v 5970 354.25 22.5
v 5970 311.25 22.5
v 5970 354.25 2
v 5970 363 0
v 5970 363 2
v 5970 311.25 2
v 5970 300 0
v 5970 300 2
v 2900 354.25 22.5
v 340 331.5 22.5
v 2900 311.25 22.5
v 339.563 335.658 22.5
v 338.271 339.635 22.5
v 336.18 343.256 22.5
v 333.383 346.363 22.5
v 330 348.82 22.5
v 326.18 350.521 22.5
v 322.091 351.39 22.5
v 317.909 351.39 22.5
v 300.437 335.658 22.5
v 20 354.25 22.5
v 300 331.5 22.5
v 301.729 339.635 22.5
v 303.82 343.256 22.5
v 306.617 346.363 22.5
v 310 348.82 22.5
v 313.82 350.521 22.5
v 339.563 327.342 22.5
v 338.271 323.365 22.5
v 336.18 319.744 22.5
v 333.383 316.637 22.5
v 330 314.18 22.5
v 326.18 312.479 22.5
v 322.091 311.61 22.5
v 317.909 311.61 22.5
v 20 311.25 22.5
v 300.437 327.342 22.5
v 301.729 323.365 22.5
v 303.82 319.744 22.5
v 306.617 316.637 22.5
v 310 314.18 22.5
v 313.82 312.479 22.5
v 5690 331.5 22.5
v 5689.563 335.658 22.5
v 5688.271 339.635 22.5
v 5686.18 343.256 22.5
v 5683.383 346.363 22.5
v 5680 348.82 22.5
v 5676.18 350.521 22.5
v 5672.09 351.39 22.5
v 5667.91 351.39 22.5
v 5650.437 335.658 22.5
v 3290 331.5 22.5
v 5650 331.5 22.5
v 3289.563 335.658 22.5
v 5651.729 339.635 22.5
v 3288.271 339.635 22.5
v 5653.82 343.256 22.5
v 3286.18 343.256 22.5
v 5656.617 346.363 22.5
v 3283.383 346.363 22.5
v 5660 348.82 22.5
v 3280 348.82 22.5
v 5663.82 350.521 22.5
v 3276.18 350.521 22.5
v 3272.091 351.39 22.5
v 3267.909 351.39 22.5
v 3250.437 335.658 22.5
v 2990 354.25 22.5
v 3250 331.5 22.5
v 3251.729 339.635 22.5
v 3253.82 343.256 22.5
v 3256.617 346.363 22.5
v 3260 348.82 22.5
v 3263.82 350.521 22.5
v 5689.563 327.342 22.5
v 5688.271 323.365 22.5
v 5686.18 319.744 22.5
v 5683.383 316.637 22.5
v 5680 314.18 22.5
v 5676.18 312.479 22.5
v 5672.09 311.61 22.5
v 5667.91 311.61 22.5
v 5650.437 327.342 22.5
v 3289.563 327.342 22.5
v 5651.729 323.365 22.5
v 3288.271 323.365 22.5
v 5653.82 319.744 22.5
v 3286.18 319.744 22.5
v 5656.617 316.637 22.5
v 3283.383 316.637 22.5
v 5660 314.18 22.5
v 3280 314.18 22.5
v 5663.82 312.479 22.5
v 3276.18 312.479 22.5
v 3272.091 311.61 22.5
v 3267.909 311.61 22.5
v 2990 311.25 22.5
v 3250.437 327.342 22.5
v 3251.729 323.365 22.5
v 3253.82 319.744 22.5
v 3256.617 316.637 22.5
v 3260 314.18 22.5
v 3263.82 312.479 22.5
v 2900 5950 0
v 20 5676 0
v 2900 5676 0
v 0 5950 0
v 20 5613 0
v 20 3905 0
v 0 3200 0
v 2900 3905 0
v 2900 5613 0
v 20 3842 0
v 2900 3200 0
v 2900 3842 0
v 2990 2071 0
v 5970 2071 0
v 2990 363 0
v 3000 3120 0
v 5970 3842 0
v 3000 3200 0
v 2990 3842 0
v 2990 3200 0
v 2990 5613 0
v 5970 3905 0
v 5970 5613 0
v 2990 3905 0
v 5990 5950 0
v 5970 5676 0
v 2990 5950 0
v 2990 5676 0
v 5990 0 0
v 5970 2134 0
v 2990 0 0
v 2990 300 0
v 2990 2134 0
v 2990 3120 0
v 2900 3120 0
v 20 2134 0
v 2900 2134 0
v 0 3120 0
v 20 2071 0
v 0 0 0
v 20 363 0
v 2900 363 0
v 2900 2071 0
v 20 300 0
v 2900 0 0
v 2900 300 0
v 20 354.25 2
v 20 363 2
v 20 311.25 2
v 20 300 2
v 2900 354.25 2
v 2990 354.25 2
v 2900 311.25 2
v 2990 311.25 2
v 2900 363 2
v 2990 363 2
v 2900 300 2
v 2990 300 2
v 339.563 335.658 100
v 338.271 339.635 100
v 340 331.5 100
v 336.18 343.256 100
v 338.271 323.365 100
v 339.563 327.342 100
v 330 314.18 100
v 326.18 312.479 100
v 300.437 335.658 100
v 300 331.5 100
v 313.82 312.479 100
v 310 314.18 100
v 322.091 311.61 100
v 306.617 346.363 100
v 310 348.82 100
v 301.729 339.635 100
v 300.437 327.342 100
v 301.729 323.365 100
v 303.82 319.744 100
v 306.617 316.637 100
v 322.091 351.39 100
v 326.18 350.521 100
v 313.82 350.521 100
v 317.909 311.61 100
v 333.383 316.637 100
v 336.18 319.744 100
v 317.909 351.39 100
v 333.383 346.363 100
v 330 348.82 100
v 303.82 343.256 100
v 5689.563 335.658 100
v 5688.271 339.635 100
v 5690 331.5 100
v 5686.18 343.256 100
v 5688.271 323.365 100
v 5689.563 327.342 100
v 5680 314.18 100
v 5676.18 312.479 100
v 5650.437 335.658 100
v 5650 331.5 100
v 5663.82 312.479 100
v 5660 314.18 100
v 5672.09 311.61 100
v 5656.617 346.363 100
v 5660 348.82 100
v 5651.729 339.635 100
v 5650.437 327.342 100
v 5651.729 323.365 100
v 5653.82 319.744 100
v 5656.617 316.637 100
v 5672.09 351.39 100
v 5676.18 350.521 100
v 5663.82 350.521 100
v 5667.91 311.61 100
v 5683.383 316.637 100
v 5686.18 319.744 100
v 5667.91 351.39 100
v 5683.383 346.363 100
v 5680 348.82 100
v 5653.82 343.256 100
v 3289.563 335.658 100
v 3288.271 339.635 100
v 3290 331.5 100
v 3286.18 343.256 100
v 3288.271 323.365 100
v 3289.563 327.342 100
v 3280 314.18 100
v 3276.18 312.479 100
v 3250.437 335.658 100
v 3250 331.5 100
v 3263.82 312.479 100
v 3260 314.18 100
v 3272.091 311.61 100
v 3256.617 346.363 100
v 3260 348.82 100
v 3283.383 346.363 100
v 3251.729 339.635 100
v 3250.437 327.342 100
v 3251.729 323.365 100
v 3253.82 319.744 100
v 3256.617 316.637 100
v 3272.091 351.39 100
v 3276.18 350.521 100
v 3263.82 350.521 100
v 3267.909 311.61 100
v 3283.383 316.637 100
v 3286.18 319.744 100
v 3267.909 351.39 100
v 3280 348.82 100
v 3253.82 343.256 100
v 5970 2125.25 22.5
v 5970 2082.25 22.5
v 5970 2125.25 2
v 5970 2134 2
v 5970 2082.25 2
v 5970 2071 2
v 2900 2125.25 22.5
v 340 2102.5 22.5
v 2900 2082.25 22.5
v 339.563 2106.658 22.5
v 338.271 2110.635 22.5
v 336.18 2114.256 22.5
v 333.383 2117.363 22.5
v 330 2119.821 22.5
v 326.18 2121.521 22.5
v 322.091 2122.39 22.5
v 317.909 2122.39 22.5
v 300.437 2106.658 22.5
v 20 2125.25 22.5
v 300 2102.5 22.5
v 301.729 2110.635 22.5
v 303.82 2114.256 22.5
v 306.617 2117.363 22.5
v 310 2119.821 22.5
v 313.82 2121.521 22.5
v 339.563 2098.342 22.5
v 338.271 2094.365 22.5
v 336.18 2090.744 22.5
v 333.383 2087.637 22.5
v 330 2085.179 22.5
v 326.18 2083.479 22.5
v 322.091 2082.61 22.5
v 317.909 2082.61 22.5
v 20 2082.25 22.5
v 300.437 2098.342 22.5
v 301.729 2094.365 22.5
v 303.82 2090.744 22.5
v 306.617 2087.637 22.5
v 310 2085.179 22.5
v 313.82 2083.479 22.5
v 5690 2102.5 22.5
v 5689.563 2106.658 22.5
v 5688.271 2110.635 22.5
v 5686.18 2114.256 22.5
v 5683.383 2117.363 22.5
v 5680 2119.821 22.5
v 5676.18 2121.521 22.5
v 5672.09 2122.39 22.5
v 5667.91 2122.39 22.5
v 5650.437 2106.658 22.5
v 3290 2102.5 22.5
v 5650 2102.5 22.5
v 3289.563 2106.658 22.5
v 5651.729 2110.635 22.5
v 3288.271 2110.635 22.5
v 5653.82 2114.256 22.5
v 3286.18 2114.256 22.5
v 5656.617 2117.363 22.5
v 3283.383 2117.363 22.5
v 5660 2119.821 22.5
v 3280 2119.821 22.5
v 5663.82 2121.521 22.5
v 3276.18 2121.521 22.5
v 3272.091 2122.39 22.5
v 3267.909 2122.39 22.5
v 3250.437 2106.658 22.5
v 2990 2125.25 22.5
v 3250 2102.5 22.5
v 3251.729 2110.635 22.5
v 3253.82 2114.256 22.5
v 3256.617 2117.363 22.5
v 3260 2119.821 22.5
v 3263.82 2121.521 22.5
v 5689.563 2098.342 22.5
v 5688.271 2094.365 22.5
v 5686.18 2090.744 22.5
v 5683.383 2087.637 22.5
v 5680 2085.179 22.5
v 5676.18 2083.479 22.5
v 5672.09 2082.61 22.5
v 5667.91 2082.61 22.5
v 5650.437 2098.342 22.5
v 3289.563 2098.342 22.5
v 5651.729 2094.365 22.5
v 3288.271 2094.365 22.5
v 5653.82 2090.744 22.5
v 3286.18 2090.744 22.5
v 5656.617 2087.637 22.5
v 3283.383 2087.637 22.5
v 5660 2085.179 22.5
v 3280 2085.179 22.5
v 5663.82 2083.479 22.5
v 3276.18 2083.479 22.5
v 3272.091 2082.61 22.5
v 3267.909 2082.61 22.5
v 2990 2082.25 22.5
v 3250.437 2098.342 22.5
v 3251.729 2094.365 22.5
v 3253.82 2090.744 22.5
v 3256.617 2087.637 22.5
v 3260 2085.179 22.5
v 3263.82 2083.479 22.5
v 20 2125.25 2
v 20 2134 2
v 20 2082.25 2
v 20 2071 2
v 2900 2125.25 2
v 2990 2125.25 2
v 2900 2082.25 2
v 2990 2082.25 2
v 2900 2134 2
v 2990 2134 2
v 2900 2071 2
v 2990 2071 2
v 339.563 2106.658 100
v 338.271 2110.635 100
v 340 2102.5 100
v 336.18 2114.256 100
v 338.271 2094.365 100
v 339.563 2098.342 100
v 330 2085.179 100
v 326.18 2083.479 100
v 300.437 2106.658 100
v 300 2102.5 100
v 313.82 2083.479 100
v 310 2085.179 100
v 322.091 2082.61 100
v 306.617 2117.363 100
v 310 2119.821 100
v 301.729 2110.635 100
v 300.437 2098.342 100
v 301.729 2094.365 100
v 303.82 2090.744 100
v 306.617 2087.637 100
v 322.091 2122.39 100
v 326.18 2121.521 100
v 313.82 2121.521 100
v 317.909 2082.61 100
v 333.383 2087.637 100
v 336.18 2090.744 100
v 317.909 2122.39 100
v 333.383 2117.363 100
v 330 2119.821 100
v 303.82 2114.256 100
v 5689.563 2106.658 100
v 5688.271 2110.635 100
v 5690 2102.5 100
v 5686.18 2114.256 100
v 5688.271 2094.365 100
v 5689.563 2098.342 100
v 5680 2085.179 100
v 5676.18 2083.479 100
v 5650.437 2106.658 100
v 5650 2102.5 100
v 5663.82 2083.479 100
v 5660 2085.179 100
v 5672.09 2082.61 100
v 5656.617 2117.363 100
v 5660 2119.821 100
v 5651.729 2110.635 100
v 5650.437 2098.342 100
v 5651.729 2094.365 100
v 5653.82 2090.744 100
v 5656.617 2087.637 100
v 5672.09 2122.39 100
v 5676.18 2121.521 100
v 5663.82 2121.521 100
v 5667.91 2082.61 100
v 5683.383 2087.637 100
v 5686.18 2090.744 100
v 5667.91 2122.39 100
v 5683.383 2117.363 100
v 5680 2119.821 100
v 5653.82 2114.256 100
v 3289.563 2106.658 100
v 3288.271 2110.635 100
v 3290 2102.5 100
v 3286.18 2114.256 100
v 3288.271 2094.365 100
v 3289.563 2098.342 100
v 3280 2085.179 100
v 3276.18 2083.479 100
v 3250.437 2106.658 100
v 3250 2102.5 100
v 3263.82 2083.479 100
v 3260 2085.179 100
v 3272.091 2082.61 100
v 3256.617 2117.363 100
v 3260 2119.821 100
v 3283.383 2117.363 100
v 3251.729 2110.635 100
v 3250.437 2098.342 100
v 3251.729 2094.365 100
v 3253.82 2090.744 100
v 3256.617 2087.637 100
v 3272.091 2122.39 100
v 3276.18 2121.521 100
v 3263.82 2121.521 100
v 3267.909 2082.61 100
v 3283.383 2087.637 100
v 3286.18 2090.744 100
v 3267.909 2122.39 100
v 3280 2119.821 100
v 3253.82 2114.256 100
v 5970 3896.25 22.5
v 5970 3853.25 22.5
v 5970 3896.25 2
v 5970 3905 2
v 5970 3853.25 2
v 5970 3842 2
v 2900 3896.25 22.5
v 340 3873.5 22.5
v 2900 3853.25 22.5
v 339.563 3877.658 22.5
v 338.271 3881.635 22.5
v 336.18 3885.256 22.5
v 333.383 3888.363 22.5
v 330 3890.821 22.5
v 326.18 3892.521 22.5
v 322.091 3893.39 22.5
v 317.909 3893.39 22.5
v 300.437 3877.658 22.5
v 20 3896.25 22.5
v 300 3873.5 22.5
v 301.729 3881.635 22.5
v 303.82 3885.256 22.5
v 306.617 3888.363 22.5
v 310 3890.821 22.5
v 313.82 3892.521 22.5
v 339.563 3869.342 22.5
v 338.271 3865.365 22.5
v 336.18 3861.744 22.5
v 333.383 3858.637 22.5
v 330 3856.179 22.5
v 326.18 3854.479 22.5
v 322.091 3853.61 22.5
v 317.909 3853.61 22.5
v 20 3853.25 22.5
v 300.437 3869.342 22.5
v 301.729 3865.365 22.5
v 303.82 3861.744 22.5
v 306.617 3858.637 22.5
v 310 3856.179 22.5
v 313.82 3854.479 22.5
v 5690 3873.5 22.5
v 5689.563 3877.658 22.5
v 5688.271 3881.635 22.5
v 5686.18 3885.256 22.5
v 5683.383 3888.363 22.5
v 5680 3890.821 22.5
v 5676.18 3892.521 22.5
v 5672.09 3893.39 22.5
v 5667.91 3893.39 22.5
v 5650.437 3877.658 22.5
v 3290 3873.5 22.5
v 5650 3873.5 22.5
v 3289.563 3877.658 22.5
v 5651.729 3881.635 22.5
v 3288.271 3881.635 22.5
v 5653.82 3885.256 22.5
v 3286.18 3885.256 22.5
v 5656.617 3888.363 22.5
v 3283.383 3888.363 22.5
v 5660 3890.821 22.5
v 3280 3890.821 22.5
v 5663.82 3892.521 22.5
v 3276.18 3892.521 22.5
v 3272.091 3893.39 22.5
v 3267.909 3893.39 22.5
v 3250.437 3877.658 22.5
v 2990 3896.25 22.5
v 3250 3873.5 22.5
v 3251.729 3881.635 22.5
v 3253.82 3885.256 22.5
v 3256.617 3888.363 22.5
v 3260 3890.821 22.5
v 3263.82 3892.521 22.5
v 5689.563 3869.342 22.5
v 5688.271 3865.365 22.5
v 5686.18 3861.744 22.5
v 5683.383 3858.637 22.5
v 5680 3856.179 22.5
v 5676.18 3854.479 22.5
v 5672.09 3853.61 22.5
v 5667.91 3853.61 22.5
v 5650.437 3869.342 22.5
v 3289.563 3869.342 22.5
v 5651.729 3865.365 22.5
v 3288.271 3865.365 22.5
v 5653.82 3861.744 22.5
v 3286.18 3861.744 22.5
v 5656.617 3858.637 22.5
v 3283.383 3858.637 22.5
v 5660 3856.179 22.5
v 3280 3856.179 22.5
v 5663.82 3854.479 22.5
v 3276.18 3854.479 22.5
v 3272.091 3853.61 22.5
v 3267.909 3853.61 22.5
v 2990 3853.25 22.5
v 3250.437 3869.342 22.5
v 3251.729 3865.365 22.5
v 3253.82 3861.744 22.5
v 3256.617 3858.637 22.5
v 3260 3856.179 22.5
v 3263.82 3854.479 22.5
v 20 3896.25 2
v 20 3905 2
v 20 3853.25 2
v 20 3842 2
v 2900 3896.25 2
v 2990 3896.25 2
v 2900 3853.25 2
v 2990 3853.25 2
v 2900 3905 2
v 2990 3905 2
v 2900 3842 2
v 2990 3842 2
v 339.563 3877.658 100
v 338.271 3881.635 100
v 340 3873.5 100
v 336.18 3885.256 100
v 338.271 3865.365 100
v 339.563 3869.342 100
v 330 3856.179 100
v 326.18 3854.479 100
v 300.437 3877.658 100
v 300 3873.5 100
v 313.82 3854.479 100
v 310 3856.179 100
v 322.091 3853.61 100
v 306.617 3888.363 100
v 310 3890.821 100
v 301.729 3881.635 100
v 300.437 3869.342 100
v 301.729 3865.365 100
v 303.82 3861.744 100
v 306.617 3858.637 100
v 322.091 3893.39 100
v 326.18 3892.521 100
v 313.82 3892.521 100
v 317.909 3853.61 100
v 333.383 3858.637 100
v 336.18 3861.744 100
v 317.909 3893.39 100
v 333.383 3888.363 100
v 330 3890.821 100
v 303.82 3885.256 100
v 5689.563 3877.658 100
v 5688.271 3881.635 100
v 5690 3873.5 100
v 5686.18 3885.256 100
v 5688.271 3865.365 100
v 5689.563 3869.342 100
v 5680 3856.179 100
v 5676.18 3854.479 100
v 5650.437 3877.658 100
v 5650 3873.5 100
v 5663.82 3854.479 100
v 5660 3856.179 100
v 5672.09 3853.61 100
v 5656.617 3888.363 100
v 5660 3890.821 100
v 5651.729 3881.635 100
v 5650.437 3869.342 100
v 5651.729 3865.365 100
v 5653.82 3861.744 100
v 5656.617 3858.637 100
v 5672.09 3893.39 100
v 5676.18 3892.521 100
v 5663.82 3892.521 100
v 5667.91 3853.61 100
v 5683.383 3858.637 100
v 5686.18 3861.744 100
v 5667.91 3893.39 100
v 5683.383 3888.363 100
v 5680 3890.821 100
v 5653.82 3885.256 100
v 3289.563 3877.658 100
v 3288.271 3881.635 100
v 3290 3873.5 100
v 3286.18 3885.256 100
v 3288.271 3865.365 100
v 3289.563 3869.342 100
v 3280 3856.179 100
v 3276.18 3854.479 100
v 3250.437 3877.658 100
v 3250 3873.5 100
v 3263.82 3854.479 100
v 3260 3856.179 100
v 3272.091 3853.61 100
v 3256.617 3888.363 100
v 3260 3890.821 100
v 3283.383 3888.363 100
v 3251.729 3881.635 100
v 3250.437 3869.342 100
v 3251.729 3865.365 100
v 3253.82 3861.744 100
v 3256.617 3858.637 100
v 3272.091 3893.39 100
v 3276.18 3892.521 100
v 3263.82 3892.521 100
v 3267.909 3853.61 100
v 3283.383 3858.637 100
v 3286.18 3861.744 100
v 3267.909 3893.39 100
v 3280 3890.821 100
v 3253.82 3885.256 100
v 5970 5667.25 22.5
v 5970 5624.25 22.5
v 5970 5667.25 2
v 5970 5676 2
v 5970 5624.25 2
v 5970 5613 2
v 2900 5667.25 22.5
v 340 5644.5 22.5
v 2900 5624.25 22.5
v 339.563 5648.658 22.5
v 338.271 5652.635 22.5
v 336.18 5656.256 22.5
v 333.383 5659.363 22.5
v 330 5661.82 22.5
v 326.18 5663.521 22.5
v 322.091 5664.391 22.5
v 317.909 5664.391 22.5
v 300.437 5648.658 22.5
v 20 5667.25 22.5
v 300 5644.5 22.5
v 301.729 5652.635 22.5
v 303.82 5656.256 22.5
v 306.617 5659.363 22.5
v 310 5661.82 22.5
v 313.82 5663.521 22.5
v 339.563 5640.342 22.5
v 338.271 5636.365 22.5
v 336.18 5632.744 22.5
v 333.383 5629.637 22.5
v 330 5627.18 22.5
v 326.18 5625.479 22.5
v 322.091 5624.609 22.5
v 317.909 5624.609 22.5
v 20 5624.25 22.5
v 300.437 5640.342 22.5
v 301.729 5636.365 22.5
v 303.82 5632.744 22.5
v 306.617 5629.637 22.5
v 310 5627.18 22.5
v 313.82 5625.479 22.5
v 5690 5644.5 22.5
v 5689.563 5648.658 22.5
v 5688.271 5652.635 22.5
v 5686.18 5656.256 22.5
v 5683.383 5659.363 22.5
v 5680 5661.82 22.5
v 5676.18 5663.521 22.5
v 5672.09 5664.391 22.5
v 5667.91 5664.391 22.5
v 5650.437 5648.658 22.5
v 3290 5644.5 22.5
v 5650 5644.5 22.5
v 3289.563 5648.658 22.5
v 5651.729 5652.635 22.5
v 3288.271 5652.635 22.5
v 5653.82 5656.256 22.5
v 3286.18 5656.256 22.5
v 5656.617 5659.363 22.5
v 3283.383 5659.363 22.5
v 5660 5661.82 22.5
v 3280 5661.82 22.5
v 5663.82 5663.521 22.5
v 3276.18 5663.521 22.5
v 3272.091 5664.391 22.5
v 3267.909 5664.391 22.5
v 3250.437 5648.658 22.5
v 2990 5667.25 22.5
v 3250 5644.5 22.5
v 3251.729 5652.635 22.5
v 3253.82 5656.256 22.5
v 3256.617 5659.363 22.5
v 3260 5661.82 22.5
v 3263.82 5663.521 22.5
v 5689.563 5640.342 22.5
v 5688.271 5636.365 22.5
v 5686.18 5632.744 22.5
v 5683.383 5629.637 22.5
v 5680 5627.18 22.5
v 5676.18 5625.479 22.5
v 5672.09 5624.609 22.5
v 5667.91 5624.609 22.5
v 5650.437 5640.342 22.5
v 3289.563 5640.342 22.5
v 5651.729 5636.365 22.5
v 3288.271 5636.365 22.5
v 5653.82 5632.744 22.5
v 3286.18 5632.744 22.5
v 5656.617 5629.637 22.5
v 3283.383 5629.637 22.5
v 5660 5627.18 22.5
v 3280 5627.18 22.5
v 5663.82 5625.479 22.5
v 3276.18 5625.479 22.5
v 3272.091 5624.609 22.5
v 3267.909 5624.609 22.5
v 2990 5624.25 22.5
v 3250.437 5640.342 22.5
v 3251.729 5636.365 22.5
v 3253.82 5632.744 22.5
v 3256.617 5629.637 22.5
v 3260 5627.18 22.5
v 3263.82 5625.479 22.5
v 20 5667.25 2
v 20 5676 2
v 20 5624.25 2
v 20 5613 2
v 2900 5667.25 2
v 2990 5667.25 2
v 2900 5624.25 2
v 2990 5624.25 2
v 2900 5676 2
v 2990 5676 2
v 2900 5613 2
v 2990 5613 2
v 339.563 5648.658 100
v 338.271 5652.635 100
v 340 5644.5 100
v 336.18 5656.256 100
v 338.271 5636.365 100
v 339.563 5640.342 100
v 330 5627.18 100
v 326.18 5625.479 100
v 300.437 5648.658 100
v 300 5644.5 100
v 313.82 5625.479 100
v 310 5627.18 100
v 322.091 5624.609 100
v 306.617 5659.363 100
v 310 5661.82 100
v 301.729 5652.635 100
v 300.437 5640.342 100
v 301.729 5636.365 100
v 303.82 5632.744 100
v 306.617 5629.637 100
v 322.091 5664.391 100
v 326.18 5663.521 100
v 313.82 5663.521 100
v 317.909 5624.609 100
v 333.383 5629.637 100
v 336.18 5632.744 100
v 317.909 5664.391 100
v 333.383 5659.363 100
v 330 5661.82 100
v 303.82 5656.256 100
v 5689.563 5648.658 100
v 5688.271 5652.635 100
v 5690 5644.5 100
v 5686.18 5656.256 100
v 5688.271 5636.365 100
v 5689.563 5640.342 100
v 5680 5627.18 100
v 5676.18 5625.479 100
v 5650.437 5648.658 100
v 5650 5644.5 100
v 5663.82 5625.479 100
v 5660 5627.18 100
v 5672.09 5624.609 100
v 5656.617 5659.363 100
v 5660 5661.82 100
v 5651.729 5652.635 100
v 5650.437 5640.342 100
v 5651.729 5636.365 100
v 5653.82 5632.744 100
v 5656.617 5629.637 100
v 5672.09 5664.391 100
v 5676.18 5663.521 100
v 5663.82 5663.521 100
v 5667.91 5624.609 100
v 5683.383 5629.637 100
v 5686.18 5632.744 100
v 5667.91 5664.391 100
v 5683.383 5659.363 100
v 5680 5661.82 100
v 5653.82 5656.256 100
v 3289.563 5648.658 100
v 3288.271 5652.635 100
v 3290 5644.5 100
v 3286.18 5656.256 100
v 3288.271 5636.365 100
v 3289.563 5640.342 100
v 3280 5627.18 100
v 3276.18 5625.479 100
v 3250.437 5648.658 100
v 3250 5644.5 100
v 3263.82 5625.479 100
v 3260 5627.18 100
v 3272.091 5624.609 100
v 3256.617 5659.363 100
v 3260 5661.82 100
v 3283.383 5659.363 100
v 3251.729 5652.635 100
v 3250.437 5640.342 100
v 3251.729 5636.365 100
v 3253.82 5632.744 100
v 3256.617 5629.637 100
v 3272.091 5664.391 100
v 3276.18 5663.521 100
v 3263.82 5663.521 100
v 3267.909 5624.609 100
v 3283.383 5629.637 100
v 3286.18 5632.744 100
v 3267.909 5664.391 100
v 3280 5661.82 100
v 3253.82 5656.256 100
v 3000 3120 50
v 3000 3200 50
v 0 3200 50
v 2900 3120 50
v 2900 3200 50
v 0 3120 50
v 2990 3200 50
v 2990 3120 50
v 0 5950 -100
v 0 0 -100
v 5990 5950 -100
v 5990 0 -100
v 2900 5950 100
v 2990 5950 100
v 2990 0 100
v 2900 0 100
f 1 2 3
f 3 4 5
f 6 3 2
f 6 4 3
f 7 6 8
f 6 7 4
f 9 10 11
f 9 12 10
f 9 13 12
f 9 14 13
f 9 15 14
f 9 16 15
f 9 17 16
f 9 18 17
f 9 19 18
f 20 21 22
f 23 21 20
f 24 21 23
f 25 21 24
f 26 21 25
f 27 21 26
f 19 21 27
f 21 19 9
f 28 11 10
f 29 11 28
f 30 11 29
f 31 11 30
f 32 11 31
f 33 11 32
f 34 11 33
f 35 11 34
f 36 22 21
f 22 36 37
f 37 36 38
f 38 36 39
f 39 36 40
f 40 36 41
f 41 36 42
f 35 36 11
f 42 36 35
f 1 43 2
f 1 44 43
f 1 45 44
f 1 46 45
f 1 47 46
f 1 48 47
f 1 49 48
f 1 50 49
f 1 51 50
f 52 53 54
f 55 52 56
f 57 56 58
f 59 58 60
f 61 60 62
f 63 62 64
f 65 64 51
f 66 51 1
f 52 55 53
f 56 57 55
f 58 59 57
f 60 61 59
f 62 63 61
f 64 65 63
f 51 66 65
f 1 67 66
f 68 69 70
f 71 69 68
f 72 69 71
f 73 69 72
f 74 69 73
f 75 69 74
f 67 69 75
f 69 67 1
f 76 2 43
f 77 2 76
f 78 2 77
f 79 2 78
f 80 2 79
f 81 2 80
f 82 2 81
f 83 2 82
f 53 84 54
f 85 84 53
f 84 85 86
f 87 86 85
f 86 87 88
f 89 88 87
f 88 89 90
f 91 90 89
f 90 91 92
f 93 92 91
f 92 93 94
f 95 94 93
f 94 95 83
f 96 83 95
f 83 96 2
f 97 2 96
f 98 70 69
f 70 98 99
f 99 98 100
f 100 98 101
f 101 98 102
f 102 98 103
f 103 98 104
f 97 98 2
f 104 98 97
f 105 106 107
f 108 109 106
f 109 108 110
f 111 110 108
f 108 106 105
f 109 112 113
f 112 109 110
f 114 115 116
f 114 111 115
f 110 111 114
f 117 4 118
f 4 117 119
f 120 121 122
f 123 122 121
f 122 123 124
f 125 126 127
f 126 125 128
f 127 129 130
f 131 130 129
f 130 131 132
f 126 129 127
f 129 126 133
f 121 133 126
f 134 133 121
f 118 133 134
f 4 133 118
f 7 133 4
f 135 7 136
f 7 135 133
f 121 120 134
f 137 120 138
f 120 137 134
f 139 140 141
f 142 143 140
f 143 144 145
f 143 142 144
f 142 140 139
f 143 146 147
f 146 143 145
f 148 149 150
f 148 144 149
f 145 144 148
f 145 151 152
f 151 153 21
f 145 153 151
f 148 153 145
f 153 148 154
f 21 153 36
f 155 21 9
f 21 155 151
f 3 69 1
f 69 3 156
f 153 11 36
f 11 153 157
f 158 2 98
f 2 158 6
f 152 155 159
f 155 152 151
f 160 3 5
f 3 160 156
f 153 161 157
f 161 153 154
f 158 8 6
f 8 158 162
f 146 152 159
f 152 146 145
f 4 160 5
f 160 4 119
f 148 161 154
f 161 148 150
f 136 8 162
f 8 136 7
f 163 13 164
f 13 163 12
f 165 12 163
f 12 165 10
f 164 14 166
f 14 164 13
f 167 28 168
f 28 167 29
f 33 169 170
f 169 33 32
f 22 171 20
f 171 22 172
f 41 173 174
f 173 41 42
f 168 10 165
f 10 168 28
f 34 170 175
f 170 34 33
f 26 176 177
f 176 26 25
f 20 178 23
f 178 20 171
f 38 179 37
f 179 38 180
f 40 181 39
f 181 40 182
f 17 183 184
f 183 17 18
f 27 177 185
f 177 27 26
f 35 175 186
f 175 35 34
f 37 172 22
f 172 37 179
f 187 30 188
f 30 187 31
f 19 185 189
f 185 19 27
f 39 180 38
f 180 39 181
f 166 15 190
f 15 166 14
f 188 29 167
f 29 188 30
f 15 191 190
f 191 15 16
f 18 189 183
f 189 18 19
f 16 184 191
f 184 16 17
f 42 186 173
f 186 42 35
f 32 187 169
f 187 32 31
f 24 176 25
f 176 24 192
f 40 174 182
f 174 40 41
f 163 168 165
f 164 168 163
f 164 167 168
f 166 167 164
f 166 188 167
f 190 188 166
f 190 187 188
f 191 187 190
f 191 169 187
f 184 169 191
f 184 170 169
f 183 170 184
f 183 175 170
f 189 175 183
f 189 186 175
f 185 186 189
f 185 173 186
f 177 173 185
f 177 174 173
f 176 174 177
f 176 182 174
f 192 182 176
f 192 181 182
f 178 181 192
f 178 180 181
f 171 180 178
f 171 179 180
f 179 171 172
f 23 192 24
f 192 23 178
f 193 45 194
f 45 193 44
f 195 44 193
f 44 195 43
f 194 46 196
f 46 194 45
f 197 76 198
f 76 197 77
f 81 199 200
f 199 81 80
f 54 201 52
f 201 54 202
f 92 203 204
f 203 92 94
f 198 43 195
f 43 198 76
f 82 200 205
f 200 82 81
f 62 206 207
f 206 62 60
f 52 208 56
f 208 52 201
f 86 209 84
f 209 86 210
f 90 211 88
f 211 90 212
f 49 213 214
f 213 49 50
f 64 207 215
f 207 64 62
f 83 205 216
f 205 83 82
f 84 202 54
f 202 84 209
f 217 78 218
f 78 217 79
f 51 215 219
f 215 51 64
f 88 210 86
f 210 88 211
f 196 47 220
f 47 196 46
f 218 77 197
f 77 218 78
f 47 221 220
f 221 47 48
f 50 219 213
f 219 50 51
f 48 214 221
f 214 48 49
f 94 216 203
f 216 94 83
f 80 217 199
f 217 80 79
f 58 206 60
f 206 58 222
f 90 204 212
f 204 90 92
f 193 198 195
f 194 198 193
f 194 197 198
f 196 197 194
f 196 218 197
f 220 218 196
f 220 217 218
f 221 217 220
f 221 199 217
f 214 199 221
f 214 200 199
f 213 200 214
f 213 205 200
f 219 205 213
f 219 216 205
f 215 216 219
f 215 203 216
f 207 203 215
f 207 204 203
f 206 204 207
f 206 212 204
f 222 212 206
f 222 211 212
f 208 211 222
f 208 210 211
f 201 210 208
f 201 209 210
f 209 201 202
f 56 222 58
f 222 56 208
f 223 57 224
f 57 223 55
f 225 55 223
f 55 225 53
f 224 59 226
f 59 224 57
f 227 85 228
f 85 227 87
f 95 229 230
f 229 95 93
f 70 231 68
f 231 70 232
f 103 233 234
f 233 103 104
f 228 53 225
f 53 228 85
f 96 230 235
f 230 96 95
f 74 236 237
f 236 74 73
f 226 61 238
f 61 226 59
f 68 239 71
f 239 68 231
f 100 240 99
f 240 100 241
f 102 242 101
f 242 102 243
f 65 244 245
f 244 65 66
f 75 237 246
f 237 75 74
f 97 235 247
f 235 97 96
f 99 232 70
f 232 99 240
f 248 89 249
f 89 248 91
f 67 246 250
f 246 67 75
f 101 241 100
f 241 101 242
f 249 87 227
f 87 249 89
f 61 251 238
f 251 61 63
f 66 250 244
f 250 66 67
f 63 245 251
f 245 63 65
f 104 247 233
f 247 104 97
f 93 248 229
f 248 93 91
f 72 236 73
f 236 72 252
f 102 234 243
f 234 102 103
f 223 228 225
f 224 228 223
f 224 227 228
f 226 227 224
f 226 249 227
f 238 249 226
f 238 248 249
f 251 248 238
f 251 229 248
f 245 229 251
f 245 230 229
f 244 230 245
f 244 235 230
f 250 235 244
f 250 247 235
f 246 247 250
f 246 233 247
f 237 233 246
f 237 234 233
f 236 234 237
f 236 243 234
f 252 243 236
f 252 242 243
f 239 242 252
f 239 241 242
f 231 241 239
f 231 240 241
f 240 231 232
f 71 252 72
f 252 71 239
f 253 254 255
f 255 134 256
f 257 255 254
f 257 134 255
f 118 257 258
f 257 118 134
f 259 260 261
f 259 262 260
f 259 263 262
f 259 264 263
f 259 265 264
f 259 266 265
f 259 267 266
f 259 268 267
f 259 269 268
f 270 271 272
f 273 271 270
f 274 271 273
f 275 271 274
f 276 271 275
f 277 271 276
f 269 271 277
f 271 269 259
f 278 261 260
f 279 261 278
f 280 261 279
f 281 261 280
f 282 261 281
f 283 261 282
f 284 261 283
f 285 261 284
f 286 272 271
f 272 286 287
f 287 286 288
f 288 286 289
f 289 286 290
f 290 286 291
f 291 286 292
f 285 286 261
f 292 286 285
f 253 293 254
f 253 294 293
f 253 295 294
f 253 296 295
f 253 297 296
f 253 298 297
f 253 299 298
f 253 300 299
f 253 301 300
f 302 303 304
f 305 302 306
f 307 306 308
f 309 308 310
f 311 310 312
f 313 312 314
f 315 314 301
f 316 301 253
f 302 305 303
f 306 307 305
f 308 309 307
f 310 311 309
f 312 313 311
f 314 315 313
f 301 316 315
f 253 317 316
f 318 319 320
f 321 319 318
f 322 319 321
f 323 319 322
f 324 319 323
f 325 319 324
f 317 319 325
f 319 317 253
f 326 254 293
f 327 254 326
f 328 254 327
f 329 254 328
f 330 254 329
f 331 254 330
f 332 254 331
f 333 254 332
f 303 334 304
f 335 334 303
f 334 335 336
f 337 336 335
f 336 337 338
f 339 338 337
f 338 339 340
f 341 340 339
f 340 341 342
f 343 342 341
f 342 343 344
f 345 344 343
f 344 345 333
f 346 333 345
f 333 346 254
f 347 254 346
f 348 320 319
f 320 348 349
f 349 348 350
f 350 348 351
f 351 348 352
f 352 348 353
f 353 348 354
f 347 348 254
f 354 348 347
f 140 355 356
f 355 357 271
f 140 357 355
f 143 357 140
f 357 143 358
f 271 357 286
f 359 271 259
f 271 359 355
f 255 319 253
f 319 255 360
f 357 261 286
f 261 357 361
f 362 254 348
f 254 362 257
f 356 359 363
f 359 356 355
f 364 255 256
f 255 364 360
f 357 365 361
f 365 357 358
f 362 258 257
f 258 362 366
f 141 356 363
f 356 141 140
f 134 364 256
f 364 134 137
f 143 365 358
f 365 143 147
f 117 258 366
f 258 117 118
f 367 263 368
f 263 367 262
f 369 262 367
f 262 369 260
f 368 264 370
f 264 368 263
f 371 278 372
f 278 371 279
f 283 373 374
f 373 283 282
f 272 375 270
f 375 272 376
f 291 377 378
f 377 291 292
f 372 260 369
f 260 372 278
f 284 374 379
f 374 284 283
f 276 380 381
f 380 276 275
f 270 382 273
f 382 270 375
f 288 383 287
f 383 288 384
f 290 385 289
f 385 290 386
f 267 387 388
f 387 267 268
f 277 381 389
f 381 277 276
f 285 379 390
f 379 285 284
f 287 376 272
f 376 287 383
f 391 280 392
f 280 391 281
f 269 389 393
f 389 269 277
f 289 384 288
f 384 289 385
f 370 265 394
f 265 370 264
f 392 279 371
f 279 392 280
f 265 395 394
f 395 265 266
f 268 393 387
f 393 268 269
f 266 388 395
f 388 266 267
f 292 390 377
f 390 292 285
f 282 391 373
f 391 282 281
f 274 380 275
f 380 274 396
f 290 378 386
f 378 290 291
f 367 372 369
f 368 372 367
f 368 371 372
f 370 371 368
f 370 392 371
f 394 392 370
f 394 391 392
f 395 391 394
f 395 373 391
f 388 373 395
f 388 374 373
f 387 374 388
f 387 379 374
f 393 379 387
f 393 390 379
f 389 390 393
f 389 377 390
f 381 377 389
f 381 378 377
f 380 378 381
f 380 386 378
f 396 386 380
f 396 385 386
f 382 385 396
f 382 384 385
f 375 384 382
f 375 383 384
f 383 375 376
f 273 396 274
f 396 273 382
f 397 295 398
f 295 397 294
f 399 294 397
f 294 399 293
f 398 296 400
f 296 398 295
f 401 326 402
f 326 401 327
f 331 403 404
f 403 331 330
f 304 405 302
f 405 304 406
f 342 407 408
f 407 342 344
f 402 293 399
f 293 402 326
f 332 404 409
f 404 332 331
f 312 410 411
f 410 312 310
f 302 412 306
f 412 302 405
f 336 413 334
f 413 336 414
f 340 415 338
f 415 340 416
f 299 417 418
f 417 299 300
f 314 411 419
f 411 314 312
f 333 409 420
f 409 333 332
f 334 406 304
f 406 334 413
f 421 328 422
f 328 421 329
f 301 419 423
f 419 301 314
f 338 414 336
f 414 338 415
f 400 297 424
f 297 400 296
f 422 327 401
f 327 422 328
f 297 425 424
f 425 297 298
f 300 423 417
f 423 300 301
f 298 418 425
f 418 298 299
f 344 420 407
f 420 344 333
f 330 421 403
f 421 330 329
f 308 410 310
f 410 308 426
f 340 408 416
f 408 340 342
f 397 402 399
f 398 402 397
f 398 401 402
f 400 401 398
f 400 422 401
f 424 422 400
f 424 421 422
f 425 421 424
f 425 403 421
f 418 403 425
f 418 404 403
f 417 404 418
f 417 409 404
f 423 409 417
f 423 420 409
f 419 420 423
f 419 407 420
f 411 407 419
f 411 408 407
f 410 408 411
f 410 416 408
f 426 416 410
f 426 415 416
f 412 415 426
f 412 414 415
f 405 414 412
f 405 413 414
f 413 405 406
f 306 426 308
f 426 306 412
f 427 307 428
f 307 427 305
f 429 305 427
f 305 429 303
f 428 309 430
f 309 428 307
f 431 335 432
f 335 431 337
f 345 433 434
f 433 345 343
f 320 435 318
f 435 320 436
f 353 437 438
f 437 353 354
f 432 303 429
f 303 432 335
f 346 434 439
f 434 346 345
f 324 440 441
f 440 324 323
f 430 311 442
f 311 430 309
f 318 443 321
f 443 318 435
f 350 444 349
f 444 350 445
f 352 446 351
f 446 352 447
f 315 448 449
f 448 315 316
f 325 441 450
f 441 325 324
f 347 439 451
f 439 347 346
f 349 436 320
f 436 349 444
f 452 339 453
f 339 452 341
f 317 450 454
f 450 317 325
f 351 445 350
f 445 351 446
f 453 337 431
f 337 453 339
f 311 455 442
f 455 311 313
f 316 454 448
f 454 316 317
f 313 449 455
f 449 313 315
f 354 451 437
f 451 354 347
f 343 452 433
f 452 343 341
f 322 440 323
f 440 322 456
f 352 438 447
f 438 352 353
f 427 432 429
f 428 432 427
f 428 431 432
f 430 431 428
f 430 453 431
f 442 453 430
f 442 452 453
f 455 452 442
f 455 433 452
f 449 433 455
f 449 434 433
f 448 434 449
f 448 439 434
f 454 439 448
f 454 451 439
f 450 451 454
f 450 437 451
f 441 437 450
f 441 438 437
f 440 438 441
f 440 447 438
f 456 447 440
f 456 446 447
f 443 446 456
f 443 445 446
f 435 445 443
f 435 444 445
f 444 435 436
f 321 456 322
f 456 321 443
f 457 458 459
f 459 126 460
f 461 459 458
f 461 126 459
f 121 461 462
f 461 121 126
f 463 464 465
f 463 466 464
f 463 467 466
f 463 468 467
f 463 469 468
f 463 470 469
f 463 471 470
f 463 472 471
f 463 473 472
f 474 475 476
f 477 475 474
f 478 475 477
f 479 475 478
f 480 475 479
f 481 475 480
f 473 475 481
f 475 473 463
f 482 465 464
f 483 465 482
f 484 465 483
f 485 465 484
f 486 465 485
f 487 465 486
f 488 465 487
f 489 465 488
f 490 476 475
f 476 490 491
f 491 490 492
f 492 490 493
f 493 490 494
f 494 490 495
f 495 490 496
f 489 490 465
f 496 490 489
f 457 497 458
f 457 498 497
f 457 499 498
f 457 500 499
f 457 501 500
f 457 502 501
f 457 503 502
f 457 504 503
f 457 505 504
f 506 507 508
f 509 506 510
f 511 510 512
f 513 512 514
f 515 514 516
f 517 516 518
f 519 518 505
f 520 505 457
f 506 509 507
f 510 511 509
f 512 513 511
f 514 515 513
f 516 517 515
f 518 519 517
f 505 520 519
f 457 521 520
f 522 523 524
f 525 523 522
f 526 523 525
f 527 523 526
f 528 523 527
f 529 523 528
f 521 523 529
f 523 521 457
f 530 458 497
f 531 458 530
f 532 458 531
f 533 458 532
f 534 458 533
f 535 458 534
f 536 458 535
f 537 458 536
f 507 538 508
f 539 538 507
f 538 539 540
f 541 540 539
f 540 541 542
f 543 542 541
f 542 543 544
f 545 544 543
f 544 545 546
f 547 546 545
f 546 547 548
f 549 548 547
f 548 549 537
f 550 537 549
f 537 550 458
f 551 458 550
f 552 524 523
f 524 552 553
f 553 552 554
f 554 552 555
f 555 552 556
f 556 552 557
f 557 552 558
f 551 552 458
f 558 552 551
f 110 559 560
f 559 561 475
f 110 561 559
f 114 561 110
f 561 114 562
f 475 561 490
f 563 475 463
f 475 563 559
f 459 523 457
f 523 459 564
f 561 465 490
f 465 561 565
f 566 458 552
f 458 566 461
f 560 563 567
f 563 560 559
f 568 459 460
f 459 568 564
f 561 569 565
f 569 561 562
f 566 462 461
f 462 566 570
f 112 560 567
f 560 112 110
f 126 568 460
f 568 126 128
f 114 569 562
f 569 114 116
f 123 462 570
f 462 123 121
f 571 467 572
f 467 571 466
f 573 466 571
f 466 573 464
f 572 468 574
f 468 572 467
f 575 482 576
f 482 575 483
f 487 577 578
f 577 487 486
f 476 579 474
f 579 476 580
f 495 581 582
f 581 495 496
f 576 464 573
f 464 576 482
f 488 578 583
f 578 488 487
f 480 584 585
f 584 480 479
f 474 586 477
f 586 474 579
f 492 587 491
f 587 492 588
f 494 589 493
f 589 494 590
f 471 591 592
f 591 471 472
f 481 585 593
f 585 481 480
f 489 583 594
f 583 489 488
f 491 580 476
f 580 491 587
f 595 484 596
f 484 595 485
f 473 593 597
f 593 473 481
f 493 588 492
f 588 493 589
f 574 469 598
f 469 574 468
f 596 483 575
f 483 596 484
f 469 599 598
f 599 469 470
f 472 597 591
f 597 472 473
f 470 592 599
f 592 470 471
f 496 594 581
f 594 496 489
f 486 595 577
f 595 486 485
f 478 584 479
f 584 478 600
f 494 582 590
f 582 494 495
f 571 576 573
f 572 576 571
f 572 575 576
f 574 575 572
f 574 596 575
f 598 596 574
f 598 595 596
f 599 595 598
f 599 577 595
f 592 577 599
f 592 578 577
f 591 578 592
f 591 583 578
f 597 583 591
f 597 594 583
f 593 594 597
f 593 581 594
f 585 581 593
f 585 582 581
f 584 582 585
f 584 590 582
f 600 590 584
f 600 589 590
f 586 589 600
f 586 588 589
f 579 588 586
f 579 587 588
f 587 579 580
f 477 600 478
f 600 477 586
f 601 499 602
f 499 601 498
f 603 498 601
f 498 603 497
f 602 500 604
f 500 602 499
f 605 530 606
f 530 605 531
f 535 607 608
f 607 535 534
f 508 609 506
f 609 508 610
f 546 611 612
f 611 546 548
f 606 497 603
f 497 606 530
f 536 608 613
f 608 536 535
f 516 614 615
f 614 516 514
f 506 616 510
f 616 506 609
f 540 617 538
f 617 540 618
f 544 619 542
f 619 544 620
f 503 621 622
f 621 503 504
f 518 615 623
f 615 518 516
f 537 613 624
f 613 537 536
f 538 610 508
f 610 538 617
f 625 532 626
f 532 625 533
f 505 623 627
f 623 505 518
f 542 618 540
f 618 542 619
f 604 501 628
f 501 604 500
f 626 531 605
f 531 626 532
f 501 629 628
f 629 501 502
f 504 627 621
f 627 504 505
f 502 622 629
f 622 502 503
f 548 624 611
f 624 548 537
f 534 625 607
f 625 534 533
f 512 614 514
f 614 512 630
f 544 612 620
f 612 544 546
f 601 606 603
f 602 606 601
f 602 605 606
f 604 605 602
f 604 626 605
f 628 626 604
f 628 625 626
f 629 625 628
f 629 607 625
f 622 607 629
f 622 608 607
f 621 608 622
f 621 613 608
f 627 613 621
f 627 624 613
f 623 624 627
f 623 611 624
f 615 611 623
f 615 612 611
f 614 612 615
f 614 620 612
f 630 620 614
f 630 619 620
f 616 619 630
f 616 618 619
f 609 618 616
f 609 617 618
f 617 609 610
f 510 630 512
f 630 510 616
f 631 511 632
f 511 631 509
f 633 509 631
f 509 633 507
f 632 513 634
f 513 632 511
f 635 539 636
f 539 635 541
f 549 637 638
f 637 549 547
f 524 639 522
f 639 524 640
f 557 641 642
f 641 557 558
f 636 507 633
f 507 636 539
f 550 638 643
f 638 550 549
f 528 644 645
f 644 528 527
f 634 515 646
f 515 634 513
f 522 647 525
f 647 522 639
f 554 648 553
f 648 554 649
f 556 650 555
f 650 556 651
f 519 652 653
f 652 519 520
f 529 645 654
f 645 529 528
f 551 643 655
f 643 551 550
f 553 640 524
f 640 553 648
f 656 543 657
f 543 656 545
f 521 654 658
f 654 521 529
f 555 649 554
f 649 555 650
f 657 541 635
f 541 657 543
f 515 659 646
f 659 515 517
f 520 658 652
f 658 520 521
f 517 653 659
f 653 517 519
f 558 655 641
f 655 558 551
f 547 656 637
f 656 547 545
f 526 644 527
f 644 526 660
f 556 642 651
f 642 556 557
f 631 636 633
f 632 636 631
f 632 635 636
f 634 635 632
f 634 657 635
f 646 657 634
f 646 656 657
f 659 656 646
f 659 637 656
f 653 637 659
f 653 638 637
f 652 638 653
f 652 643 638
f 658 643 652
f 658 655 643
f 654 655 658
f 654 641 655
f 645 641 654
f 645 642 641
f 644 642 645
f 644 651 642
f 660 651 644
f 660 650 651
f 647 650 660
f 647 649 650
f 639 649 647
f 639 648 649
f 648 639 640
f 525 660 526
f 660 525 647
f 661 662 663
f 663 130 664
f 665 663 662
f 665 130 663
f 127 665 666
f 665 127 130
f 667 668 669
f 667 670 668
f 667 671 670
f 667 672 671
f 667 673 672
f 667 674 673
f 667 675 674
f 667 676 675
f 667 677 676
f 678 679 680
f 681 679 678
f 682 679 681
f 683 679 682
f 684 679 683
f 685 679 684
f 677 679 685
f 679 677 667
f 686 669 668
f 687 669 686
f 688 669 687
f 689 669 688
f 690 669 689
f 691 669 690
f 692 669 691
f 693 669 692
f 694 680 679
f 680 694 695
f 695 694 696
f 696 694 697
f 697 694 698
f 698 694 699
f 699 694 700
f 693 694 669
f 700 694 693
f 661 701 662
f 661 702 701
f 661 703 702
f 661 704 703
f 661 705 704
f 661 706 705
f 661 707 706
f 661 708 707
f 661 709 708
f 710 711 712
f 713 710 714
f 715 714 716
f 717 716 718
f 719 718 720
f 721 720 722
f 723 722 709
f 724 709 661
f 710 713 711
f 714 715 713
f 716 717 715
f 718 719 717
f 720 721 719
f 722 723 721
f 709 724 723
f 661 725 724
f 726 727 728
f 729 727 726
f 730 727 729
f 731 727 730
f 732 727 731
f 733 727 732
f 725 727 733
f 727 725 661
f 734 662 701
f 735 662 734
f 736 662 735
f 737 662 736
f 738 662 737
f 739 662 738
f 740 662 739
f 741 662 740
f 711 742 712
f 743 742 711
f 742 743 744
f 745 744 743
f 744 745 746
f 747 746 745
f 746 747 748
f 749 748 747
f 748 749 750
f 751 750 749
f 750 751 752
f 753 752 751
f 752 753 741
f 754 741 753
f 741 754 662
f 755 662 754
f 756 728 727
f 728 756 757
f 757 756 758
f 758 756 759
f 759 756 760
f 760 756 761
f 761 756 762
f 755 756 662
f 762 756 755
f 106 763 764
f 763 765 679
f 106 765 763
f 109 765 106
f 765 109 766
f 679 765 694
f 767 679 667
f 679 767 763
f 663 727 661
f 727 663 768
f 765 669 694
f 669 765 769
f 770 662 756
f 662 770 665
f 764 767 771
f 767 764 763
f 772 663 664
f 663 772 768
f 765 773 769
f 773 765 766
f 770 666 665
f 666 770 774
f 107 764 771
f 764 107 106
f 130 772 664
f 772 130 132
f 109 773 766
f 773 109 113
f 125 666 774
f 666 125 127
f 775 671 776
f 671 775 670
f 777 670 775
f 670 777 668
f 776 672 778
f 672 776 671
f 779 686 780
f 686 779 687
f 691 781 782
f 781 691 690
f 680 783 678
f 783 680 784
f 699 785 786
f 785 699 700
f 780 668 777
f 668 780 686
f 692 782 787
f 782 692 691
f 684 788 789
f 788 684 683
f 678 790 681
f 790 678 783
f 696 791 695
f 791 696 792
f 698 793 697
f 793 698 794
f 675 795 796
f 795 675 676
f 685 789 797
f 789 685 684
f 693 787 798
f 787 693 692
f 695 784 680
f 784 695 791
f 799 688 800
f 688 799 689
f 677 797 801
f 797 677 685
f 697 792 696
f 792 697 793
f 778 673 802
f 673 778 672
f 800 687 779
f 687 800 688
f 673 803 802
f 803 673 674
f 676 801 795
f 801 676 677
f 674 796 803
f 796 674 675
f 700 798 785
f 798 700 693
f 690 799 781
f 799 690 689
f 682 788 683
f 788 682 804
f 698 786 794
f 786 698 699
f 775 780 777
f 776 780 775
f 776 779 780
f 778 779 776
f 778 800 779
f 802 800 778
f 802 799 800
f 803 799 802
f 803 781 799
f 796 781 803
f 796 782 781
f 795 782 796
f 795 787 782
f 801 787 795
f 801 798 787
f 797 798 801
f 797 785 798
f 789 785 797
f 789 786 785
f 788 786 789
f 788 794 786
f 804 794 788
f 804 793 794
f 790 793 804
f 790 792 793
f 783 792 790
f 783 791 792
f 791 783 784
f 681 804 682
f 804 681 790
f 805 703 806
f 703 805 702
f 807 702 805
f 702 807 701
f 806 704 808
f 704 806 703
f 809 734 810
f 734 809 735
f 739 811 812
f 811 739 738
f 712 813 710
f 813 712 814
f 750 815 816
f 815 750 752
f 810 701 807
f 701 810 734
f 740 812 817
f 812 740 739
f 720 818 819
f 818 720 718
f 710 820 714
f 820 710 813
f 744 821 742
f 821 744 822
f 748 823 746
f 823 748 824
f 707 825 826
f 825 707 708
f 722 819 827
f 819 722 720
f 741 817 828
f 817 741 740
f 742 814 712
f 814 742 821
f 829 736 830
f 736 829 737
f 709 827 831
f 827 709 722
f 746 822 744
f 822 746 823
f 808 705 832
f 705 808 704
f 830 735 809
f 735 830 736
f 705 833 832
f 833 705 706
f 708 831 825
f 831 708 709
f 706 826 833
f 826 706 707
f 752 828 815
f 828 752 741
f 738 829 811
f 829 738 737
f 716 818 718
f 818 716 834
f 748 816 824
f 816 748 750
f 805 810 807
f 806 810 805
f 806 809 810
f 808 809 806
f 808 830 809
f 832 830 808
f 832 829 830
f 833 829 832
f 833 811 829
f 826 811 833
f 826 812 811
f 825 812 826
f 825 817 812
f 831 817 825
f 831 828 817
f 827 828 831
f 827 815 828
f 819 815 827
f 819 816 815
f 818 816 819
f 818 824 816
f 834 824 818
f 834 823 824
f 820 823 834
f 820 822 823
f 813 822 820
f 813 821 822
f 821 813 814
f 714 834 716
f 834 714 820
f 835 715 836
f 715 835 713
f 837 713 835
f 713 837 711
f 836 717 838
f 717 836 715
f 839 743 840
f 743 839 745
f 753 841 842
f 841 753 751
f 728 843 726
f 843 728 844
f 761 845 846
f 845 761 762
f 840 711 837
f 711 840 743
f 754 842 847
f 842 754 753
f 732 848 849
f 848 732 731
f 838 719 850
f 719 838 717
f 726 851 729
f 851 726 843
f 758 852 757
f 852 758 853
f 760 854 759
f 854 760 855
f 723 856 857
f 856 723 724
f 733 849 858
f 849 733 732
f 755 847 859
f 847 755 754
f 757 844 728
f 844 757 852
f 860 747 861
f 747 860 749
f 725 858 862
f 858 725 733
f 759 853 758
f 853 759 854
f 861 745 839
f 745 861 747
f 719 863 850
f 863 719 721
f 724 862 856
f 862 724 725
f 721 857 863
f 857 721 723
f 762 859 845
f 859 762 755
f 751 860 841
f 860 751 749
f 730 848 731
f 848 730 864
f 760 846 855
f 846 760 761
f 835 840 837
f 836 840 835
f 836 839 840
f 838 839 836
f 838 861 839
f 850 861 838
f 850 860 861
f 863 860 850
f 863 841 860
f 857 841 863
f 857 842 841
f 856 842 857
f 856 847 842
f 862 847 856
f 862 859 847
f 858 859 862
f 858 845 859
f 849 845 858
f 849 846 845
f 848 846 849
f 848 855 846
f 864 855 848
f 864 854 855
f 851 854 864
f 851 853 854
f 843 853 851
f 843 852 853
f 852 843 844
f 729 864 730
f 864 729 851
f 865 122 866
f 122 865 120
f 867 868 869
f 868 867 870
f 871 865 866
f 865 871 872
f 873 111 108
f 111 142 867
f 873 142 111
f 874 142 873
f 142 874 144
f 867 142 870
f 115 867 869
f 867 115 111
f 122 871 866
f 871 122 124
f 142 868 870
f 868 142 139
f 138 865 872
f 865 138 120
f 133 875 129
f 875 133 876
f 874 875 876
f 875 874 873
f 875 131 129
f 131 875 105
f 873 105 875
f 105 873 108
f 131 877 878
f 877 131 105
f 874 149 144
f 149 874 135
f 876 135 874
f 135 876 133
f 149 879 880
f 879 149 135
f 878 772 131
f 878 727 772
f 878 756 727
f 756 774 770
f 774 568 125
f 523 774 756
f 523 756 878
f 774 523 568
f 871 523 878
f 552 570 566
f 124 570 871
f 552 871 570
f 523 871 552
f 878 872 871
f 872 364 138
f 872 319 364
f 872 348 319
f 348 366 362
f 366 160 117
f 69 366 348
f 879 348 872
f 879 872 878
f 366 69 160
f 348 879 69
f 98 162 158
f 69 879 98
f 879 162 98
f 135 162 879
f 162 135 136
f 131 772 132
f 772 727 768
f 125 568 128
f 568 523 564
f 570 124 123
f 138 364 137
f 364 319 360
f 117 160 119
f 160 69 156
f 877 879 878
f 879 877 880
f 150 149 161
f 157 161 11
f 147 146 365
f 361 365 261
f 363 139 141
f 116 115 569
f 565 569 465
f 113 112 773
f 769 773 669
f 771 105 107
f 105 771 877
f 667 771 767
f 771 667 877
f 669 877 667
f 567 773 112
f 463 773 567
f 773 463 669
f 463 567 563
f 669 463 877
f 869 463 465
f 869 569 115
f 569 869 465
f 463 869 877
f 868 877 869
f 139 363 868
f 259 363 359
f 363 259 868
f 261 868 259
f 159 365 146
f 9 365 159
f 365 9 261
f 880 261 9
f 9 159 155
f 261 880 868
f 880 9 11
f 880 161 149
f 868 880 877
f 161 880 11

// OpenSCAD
panellaenge=1762;
laengezuschlag=9; //mittelklemme pro panel zuschlag

// torschiene
color("red") translate([0, 3120, 0]) cube([3000, 80, 50]);
// Decke innen
color("gray") translate([0, 0, -100]) cube([5990, 5950, 100]);
// träger
color("red") translate([5990-90-3000, 0, 0]) cube([90, 5950, 100]);
translate([-1000, 5500, 0]) rotate([0, 0, -90]) text(text="GARAGENTOR", size=500);
module profil() {
  translate([0, 22.5/2, 0]) cube([5950, 43, 22.5]);
  cube([5950, 63, 2]);
  // loch links
  color("blue") translate([300, 63/2, 0]) cylinder(h=100, d=40);
  // loch rechts
  color("blue") translate([5950 - 300, 63/2, 0]) cylinder(h=100, d=40);
  // loch mitte
  color("blue") translate([5950 - 3000 + 300, 63/2, 0]) cylinder(h=100, d=40);
}
module panel() {
  cube([1762, 1134, 30]);
}

translate([0, 300, 0]) {
  verschieb = panellaenge + laengezuschlag;
  translate([20, 0*verschieb, 0]) profil();
  translate([20, 1*verschieb, 0]) profil();
  translate([20, 2*verschieb, 0]) profil();
  translate([20, 3*verschieb, 0]) profil();
}

//panel();
